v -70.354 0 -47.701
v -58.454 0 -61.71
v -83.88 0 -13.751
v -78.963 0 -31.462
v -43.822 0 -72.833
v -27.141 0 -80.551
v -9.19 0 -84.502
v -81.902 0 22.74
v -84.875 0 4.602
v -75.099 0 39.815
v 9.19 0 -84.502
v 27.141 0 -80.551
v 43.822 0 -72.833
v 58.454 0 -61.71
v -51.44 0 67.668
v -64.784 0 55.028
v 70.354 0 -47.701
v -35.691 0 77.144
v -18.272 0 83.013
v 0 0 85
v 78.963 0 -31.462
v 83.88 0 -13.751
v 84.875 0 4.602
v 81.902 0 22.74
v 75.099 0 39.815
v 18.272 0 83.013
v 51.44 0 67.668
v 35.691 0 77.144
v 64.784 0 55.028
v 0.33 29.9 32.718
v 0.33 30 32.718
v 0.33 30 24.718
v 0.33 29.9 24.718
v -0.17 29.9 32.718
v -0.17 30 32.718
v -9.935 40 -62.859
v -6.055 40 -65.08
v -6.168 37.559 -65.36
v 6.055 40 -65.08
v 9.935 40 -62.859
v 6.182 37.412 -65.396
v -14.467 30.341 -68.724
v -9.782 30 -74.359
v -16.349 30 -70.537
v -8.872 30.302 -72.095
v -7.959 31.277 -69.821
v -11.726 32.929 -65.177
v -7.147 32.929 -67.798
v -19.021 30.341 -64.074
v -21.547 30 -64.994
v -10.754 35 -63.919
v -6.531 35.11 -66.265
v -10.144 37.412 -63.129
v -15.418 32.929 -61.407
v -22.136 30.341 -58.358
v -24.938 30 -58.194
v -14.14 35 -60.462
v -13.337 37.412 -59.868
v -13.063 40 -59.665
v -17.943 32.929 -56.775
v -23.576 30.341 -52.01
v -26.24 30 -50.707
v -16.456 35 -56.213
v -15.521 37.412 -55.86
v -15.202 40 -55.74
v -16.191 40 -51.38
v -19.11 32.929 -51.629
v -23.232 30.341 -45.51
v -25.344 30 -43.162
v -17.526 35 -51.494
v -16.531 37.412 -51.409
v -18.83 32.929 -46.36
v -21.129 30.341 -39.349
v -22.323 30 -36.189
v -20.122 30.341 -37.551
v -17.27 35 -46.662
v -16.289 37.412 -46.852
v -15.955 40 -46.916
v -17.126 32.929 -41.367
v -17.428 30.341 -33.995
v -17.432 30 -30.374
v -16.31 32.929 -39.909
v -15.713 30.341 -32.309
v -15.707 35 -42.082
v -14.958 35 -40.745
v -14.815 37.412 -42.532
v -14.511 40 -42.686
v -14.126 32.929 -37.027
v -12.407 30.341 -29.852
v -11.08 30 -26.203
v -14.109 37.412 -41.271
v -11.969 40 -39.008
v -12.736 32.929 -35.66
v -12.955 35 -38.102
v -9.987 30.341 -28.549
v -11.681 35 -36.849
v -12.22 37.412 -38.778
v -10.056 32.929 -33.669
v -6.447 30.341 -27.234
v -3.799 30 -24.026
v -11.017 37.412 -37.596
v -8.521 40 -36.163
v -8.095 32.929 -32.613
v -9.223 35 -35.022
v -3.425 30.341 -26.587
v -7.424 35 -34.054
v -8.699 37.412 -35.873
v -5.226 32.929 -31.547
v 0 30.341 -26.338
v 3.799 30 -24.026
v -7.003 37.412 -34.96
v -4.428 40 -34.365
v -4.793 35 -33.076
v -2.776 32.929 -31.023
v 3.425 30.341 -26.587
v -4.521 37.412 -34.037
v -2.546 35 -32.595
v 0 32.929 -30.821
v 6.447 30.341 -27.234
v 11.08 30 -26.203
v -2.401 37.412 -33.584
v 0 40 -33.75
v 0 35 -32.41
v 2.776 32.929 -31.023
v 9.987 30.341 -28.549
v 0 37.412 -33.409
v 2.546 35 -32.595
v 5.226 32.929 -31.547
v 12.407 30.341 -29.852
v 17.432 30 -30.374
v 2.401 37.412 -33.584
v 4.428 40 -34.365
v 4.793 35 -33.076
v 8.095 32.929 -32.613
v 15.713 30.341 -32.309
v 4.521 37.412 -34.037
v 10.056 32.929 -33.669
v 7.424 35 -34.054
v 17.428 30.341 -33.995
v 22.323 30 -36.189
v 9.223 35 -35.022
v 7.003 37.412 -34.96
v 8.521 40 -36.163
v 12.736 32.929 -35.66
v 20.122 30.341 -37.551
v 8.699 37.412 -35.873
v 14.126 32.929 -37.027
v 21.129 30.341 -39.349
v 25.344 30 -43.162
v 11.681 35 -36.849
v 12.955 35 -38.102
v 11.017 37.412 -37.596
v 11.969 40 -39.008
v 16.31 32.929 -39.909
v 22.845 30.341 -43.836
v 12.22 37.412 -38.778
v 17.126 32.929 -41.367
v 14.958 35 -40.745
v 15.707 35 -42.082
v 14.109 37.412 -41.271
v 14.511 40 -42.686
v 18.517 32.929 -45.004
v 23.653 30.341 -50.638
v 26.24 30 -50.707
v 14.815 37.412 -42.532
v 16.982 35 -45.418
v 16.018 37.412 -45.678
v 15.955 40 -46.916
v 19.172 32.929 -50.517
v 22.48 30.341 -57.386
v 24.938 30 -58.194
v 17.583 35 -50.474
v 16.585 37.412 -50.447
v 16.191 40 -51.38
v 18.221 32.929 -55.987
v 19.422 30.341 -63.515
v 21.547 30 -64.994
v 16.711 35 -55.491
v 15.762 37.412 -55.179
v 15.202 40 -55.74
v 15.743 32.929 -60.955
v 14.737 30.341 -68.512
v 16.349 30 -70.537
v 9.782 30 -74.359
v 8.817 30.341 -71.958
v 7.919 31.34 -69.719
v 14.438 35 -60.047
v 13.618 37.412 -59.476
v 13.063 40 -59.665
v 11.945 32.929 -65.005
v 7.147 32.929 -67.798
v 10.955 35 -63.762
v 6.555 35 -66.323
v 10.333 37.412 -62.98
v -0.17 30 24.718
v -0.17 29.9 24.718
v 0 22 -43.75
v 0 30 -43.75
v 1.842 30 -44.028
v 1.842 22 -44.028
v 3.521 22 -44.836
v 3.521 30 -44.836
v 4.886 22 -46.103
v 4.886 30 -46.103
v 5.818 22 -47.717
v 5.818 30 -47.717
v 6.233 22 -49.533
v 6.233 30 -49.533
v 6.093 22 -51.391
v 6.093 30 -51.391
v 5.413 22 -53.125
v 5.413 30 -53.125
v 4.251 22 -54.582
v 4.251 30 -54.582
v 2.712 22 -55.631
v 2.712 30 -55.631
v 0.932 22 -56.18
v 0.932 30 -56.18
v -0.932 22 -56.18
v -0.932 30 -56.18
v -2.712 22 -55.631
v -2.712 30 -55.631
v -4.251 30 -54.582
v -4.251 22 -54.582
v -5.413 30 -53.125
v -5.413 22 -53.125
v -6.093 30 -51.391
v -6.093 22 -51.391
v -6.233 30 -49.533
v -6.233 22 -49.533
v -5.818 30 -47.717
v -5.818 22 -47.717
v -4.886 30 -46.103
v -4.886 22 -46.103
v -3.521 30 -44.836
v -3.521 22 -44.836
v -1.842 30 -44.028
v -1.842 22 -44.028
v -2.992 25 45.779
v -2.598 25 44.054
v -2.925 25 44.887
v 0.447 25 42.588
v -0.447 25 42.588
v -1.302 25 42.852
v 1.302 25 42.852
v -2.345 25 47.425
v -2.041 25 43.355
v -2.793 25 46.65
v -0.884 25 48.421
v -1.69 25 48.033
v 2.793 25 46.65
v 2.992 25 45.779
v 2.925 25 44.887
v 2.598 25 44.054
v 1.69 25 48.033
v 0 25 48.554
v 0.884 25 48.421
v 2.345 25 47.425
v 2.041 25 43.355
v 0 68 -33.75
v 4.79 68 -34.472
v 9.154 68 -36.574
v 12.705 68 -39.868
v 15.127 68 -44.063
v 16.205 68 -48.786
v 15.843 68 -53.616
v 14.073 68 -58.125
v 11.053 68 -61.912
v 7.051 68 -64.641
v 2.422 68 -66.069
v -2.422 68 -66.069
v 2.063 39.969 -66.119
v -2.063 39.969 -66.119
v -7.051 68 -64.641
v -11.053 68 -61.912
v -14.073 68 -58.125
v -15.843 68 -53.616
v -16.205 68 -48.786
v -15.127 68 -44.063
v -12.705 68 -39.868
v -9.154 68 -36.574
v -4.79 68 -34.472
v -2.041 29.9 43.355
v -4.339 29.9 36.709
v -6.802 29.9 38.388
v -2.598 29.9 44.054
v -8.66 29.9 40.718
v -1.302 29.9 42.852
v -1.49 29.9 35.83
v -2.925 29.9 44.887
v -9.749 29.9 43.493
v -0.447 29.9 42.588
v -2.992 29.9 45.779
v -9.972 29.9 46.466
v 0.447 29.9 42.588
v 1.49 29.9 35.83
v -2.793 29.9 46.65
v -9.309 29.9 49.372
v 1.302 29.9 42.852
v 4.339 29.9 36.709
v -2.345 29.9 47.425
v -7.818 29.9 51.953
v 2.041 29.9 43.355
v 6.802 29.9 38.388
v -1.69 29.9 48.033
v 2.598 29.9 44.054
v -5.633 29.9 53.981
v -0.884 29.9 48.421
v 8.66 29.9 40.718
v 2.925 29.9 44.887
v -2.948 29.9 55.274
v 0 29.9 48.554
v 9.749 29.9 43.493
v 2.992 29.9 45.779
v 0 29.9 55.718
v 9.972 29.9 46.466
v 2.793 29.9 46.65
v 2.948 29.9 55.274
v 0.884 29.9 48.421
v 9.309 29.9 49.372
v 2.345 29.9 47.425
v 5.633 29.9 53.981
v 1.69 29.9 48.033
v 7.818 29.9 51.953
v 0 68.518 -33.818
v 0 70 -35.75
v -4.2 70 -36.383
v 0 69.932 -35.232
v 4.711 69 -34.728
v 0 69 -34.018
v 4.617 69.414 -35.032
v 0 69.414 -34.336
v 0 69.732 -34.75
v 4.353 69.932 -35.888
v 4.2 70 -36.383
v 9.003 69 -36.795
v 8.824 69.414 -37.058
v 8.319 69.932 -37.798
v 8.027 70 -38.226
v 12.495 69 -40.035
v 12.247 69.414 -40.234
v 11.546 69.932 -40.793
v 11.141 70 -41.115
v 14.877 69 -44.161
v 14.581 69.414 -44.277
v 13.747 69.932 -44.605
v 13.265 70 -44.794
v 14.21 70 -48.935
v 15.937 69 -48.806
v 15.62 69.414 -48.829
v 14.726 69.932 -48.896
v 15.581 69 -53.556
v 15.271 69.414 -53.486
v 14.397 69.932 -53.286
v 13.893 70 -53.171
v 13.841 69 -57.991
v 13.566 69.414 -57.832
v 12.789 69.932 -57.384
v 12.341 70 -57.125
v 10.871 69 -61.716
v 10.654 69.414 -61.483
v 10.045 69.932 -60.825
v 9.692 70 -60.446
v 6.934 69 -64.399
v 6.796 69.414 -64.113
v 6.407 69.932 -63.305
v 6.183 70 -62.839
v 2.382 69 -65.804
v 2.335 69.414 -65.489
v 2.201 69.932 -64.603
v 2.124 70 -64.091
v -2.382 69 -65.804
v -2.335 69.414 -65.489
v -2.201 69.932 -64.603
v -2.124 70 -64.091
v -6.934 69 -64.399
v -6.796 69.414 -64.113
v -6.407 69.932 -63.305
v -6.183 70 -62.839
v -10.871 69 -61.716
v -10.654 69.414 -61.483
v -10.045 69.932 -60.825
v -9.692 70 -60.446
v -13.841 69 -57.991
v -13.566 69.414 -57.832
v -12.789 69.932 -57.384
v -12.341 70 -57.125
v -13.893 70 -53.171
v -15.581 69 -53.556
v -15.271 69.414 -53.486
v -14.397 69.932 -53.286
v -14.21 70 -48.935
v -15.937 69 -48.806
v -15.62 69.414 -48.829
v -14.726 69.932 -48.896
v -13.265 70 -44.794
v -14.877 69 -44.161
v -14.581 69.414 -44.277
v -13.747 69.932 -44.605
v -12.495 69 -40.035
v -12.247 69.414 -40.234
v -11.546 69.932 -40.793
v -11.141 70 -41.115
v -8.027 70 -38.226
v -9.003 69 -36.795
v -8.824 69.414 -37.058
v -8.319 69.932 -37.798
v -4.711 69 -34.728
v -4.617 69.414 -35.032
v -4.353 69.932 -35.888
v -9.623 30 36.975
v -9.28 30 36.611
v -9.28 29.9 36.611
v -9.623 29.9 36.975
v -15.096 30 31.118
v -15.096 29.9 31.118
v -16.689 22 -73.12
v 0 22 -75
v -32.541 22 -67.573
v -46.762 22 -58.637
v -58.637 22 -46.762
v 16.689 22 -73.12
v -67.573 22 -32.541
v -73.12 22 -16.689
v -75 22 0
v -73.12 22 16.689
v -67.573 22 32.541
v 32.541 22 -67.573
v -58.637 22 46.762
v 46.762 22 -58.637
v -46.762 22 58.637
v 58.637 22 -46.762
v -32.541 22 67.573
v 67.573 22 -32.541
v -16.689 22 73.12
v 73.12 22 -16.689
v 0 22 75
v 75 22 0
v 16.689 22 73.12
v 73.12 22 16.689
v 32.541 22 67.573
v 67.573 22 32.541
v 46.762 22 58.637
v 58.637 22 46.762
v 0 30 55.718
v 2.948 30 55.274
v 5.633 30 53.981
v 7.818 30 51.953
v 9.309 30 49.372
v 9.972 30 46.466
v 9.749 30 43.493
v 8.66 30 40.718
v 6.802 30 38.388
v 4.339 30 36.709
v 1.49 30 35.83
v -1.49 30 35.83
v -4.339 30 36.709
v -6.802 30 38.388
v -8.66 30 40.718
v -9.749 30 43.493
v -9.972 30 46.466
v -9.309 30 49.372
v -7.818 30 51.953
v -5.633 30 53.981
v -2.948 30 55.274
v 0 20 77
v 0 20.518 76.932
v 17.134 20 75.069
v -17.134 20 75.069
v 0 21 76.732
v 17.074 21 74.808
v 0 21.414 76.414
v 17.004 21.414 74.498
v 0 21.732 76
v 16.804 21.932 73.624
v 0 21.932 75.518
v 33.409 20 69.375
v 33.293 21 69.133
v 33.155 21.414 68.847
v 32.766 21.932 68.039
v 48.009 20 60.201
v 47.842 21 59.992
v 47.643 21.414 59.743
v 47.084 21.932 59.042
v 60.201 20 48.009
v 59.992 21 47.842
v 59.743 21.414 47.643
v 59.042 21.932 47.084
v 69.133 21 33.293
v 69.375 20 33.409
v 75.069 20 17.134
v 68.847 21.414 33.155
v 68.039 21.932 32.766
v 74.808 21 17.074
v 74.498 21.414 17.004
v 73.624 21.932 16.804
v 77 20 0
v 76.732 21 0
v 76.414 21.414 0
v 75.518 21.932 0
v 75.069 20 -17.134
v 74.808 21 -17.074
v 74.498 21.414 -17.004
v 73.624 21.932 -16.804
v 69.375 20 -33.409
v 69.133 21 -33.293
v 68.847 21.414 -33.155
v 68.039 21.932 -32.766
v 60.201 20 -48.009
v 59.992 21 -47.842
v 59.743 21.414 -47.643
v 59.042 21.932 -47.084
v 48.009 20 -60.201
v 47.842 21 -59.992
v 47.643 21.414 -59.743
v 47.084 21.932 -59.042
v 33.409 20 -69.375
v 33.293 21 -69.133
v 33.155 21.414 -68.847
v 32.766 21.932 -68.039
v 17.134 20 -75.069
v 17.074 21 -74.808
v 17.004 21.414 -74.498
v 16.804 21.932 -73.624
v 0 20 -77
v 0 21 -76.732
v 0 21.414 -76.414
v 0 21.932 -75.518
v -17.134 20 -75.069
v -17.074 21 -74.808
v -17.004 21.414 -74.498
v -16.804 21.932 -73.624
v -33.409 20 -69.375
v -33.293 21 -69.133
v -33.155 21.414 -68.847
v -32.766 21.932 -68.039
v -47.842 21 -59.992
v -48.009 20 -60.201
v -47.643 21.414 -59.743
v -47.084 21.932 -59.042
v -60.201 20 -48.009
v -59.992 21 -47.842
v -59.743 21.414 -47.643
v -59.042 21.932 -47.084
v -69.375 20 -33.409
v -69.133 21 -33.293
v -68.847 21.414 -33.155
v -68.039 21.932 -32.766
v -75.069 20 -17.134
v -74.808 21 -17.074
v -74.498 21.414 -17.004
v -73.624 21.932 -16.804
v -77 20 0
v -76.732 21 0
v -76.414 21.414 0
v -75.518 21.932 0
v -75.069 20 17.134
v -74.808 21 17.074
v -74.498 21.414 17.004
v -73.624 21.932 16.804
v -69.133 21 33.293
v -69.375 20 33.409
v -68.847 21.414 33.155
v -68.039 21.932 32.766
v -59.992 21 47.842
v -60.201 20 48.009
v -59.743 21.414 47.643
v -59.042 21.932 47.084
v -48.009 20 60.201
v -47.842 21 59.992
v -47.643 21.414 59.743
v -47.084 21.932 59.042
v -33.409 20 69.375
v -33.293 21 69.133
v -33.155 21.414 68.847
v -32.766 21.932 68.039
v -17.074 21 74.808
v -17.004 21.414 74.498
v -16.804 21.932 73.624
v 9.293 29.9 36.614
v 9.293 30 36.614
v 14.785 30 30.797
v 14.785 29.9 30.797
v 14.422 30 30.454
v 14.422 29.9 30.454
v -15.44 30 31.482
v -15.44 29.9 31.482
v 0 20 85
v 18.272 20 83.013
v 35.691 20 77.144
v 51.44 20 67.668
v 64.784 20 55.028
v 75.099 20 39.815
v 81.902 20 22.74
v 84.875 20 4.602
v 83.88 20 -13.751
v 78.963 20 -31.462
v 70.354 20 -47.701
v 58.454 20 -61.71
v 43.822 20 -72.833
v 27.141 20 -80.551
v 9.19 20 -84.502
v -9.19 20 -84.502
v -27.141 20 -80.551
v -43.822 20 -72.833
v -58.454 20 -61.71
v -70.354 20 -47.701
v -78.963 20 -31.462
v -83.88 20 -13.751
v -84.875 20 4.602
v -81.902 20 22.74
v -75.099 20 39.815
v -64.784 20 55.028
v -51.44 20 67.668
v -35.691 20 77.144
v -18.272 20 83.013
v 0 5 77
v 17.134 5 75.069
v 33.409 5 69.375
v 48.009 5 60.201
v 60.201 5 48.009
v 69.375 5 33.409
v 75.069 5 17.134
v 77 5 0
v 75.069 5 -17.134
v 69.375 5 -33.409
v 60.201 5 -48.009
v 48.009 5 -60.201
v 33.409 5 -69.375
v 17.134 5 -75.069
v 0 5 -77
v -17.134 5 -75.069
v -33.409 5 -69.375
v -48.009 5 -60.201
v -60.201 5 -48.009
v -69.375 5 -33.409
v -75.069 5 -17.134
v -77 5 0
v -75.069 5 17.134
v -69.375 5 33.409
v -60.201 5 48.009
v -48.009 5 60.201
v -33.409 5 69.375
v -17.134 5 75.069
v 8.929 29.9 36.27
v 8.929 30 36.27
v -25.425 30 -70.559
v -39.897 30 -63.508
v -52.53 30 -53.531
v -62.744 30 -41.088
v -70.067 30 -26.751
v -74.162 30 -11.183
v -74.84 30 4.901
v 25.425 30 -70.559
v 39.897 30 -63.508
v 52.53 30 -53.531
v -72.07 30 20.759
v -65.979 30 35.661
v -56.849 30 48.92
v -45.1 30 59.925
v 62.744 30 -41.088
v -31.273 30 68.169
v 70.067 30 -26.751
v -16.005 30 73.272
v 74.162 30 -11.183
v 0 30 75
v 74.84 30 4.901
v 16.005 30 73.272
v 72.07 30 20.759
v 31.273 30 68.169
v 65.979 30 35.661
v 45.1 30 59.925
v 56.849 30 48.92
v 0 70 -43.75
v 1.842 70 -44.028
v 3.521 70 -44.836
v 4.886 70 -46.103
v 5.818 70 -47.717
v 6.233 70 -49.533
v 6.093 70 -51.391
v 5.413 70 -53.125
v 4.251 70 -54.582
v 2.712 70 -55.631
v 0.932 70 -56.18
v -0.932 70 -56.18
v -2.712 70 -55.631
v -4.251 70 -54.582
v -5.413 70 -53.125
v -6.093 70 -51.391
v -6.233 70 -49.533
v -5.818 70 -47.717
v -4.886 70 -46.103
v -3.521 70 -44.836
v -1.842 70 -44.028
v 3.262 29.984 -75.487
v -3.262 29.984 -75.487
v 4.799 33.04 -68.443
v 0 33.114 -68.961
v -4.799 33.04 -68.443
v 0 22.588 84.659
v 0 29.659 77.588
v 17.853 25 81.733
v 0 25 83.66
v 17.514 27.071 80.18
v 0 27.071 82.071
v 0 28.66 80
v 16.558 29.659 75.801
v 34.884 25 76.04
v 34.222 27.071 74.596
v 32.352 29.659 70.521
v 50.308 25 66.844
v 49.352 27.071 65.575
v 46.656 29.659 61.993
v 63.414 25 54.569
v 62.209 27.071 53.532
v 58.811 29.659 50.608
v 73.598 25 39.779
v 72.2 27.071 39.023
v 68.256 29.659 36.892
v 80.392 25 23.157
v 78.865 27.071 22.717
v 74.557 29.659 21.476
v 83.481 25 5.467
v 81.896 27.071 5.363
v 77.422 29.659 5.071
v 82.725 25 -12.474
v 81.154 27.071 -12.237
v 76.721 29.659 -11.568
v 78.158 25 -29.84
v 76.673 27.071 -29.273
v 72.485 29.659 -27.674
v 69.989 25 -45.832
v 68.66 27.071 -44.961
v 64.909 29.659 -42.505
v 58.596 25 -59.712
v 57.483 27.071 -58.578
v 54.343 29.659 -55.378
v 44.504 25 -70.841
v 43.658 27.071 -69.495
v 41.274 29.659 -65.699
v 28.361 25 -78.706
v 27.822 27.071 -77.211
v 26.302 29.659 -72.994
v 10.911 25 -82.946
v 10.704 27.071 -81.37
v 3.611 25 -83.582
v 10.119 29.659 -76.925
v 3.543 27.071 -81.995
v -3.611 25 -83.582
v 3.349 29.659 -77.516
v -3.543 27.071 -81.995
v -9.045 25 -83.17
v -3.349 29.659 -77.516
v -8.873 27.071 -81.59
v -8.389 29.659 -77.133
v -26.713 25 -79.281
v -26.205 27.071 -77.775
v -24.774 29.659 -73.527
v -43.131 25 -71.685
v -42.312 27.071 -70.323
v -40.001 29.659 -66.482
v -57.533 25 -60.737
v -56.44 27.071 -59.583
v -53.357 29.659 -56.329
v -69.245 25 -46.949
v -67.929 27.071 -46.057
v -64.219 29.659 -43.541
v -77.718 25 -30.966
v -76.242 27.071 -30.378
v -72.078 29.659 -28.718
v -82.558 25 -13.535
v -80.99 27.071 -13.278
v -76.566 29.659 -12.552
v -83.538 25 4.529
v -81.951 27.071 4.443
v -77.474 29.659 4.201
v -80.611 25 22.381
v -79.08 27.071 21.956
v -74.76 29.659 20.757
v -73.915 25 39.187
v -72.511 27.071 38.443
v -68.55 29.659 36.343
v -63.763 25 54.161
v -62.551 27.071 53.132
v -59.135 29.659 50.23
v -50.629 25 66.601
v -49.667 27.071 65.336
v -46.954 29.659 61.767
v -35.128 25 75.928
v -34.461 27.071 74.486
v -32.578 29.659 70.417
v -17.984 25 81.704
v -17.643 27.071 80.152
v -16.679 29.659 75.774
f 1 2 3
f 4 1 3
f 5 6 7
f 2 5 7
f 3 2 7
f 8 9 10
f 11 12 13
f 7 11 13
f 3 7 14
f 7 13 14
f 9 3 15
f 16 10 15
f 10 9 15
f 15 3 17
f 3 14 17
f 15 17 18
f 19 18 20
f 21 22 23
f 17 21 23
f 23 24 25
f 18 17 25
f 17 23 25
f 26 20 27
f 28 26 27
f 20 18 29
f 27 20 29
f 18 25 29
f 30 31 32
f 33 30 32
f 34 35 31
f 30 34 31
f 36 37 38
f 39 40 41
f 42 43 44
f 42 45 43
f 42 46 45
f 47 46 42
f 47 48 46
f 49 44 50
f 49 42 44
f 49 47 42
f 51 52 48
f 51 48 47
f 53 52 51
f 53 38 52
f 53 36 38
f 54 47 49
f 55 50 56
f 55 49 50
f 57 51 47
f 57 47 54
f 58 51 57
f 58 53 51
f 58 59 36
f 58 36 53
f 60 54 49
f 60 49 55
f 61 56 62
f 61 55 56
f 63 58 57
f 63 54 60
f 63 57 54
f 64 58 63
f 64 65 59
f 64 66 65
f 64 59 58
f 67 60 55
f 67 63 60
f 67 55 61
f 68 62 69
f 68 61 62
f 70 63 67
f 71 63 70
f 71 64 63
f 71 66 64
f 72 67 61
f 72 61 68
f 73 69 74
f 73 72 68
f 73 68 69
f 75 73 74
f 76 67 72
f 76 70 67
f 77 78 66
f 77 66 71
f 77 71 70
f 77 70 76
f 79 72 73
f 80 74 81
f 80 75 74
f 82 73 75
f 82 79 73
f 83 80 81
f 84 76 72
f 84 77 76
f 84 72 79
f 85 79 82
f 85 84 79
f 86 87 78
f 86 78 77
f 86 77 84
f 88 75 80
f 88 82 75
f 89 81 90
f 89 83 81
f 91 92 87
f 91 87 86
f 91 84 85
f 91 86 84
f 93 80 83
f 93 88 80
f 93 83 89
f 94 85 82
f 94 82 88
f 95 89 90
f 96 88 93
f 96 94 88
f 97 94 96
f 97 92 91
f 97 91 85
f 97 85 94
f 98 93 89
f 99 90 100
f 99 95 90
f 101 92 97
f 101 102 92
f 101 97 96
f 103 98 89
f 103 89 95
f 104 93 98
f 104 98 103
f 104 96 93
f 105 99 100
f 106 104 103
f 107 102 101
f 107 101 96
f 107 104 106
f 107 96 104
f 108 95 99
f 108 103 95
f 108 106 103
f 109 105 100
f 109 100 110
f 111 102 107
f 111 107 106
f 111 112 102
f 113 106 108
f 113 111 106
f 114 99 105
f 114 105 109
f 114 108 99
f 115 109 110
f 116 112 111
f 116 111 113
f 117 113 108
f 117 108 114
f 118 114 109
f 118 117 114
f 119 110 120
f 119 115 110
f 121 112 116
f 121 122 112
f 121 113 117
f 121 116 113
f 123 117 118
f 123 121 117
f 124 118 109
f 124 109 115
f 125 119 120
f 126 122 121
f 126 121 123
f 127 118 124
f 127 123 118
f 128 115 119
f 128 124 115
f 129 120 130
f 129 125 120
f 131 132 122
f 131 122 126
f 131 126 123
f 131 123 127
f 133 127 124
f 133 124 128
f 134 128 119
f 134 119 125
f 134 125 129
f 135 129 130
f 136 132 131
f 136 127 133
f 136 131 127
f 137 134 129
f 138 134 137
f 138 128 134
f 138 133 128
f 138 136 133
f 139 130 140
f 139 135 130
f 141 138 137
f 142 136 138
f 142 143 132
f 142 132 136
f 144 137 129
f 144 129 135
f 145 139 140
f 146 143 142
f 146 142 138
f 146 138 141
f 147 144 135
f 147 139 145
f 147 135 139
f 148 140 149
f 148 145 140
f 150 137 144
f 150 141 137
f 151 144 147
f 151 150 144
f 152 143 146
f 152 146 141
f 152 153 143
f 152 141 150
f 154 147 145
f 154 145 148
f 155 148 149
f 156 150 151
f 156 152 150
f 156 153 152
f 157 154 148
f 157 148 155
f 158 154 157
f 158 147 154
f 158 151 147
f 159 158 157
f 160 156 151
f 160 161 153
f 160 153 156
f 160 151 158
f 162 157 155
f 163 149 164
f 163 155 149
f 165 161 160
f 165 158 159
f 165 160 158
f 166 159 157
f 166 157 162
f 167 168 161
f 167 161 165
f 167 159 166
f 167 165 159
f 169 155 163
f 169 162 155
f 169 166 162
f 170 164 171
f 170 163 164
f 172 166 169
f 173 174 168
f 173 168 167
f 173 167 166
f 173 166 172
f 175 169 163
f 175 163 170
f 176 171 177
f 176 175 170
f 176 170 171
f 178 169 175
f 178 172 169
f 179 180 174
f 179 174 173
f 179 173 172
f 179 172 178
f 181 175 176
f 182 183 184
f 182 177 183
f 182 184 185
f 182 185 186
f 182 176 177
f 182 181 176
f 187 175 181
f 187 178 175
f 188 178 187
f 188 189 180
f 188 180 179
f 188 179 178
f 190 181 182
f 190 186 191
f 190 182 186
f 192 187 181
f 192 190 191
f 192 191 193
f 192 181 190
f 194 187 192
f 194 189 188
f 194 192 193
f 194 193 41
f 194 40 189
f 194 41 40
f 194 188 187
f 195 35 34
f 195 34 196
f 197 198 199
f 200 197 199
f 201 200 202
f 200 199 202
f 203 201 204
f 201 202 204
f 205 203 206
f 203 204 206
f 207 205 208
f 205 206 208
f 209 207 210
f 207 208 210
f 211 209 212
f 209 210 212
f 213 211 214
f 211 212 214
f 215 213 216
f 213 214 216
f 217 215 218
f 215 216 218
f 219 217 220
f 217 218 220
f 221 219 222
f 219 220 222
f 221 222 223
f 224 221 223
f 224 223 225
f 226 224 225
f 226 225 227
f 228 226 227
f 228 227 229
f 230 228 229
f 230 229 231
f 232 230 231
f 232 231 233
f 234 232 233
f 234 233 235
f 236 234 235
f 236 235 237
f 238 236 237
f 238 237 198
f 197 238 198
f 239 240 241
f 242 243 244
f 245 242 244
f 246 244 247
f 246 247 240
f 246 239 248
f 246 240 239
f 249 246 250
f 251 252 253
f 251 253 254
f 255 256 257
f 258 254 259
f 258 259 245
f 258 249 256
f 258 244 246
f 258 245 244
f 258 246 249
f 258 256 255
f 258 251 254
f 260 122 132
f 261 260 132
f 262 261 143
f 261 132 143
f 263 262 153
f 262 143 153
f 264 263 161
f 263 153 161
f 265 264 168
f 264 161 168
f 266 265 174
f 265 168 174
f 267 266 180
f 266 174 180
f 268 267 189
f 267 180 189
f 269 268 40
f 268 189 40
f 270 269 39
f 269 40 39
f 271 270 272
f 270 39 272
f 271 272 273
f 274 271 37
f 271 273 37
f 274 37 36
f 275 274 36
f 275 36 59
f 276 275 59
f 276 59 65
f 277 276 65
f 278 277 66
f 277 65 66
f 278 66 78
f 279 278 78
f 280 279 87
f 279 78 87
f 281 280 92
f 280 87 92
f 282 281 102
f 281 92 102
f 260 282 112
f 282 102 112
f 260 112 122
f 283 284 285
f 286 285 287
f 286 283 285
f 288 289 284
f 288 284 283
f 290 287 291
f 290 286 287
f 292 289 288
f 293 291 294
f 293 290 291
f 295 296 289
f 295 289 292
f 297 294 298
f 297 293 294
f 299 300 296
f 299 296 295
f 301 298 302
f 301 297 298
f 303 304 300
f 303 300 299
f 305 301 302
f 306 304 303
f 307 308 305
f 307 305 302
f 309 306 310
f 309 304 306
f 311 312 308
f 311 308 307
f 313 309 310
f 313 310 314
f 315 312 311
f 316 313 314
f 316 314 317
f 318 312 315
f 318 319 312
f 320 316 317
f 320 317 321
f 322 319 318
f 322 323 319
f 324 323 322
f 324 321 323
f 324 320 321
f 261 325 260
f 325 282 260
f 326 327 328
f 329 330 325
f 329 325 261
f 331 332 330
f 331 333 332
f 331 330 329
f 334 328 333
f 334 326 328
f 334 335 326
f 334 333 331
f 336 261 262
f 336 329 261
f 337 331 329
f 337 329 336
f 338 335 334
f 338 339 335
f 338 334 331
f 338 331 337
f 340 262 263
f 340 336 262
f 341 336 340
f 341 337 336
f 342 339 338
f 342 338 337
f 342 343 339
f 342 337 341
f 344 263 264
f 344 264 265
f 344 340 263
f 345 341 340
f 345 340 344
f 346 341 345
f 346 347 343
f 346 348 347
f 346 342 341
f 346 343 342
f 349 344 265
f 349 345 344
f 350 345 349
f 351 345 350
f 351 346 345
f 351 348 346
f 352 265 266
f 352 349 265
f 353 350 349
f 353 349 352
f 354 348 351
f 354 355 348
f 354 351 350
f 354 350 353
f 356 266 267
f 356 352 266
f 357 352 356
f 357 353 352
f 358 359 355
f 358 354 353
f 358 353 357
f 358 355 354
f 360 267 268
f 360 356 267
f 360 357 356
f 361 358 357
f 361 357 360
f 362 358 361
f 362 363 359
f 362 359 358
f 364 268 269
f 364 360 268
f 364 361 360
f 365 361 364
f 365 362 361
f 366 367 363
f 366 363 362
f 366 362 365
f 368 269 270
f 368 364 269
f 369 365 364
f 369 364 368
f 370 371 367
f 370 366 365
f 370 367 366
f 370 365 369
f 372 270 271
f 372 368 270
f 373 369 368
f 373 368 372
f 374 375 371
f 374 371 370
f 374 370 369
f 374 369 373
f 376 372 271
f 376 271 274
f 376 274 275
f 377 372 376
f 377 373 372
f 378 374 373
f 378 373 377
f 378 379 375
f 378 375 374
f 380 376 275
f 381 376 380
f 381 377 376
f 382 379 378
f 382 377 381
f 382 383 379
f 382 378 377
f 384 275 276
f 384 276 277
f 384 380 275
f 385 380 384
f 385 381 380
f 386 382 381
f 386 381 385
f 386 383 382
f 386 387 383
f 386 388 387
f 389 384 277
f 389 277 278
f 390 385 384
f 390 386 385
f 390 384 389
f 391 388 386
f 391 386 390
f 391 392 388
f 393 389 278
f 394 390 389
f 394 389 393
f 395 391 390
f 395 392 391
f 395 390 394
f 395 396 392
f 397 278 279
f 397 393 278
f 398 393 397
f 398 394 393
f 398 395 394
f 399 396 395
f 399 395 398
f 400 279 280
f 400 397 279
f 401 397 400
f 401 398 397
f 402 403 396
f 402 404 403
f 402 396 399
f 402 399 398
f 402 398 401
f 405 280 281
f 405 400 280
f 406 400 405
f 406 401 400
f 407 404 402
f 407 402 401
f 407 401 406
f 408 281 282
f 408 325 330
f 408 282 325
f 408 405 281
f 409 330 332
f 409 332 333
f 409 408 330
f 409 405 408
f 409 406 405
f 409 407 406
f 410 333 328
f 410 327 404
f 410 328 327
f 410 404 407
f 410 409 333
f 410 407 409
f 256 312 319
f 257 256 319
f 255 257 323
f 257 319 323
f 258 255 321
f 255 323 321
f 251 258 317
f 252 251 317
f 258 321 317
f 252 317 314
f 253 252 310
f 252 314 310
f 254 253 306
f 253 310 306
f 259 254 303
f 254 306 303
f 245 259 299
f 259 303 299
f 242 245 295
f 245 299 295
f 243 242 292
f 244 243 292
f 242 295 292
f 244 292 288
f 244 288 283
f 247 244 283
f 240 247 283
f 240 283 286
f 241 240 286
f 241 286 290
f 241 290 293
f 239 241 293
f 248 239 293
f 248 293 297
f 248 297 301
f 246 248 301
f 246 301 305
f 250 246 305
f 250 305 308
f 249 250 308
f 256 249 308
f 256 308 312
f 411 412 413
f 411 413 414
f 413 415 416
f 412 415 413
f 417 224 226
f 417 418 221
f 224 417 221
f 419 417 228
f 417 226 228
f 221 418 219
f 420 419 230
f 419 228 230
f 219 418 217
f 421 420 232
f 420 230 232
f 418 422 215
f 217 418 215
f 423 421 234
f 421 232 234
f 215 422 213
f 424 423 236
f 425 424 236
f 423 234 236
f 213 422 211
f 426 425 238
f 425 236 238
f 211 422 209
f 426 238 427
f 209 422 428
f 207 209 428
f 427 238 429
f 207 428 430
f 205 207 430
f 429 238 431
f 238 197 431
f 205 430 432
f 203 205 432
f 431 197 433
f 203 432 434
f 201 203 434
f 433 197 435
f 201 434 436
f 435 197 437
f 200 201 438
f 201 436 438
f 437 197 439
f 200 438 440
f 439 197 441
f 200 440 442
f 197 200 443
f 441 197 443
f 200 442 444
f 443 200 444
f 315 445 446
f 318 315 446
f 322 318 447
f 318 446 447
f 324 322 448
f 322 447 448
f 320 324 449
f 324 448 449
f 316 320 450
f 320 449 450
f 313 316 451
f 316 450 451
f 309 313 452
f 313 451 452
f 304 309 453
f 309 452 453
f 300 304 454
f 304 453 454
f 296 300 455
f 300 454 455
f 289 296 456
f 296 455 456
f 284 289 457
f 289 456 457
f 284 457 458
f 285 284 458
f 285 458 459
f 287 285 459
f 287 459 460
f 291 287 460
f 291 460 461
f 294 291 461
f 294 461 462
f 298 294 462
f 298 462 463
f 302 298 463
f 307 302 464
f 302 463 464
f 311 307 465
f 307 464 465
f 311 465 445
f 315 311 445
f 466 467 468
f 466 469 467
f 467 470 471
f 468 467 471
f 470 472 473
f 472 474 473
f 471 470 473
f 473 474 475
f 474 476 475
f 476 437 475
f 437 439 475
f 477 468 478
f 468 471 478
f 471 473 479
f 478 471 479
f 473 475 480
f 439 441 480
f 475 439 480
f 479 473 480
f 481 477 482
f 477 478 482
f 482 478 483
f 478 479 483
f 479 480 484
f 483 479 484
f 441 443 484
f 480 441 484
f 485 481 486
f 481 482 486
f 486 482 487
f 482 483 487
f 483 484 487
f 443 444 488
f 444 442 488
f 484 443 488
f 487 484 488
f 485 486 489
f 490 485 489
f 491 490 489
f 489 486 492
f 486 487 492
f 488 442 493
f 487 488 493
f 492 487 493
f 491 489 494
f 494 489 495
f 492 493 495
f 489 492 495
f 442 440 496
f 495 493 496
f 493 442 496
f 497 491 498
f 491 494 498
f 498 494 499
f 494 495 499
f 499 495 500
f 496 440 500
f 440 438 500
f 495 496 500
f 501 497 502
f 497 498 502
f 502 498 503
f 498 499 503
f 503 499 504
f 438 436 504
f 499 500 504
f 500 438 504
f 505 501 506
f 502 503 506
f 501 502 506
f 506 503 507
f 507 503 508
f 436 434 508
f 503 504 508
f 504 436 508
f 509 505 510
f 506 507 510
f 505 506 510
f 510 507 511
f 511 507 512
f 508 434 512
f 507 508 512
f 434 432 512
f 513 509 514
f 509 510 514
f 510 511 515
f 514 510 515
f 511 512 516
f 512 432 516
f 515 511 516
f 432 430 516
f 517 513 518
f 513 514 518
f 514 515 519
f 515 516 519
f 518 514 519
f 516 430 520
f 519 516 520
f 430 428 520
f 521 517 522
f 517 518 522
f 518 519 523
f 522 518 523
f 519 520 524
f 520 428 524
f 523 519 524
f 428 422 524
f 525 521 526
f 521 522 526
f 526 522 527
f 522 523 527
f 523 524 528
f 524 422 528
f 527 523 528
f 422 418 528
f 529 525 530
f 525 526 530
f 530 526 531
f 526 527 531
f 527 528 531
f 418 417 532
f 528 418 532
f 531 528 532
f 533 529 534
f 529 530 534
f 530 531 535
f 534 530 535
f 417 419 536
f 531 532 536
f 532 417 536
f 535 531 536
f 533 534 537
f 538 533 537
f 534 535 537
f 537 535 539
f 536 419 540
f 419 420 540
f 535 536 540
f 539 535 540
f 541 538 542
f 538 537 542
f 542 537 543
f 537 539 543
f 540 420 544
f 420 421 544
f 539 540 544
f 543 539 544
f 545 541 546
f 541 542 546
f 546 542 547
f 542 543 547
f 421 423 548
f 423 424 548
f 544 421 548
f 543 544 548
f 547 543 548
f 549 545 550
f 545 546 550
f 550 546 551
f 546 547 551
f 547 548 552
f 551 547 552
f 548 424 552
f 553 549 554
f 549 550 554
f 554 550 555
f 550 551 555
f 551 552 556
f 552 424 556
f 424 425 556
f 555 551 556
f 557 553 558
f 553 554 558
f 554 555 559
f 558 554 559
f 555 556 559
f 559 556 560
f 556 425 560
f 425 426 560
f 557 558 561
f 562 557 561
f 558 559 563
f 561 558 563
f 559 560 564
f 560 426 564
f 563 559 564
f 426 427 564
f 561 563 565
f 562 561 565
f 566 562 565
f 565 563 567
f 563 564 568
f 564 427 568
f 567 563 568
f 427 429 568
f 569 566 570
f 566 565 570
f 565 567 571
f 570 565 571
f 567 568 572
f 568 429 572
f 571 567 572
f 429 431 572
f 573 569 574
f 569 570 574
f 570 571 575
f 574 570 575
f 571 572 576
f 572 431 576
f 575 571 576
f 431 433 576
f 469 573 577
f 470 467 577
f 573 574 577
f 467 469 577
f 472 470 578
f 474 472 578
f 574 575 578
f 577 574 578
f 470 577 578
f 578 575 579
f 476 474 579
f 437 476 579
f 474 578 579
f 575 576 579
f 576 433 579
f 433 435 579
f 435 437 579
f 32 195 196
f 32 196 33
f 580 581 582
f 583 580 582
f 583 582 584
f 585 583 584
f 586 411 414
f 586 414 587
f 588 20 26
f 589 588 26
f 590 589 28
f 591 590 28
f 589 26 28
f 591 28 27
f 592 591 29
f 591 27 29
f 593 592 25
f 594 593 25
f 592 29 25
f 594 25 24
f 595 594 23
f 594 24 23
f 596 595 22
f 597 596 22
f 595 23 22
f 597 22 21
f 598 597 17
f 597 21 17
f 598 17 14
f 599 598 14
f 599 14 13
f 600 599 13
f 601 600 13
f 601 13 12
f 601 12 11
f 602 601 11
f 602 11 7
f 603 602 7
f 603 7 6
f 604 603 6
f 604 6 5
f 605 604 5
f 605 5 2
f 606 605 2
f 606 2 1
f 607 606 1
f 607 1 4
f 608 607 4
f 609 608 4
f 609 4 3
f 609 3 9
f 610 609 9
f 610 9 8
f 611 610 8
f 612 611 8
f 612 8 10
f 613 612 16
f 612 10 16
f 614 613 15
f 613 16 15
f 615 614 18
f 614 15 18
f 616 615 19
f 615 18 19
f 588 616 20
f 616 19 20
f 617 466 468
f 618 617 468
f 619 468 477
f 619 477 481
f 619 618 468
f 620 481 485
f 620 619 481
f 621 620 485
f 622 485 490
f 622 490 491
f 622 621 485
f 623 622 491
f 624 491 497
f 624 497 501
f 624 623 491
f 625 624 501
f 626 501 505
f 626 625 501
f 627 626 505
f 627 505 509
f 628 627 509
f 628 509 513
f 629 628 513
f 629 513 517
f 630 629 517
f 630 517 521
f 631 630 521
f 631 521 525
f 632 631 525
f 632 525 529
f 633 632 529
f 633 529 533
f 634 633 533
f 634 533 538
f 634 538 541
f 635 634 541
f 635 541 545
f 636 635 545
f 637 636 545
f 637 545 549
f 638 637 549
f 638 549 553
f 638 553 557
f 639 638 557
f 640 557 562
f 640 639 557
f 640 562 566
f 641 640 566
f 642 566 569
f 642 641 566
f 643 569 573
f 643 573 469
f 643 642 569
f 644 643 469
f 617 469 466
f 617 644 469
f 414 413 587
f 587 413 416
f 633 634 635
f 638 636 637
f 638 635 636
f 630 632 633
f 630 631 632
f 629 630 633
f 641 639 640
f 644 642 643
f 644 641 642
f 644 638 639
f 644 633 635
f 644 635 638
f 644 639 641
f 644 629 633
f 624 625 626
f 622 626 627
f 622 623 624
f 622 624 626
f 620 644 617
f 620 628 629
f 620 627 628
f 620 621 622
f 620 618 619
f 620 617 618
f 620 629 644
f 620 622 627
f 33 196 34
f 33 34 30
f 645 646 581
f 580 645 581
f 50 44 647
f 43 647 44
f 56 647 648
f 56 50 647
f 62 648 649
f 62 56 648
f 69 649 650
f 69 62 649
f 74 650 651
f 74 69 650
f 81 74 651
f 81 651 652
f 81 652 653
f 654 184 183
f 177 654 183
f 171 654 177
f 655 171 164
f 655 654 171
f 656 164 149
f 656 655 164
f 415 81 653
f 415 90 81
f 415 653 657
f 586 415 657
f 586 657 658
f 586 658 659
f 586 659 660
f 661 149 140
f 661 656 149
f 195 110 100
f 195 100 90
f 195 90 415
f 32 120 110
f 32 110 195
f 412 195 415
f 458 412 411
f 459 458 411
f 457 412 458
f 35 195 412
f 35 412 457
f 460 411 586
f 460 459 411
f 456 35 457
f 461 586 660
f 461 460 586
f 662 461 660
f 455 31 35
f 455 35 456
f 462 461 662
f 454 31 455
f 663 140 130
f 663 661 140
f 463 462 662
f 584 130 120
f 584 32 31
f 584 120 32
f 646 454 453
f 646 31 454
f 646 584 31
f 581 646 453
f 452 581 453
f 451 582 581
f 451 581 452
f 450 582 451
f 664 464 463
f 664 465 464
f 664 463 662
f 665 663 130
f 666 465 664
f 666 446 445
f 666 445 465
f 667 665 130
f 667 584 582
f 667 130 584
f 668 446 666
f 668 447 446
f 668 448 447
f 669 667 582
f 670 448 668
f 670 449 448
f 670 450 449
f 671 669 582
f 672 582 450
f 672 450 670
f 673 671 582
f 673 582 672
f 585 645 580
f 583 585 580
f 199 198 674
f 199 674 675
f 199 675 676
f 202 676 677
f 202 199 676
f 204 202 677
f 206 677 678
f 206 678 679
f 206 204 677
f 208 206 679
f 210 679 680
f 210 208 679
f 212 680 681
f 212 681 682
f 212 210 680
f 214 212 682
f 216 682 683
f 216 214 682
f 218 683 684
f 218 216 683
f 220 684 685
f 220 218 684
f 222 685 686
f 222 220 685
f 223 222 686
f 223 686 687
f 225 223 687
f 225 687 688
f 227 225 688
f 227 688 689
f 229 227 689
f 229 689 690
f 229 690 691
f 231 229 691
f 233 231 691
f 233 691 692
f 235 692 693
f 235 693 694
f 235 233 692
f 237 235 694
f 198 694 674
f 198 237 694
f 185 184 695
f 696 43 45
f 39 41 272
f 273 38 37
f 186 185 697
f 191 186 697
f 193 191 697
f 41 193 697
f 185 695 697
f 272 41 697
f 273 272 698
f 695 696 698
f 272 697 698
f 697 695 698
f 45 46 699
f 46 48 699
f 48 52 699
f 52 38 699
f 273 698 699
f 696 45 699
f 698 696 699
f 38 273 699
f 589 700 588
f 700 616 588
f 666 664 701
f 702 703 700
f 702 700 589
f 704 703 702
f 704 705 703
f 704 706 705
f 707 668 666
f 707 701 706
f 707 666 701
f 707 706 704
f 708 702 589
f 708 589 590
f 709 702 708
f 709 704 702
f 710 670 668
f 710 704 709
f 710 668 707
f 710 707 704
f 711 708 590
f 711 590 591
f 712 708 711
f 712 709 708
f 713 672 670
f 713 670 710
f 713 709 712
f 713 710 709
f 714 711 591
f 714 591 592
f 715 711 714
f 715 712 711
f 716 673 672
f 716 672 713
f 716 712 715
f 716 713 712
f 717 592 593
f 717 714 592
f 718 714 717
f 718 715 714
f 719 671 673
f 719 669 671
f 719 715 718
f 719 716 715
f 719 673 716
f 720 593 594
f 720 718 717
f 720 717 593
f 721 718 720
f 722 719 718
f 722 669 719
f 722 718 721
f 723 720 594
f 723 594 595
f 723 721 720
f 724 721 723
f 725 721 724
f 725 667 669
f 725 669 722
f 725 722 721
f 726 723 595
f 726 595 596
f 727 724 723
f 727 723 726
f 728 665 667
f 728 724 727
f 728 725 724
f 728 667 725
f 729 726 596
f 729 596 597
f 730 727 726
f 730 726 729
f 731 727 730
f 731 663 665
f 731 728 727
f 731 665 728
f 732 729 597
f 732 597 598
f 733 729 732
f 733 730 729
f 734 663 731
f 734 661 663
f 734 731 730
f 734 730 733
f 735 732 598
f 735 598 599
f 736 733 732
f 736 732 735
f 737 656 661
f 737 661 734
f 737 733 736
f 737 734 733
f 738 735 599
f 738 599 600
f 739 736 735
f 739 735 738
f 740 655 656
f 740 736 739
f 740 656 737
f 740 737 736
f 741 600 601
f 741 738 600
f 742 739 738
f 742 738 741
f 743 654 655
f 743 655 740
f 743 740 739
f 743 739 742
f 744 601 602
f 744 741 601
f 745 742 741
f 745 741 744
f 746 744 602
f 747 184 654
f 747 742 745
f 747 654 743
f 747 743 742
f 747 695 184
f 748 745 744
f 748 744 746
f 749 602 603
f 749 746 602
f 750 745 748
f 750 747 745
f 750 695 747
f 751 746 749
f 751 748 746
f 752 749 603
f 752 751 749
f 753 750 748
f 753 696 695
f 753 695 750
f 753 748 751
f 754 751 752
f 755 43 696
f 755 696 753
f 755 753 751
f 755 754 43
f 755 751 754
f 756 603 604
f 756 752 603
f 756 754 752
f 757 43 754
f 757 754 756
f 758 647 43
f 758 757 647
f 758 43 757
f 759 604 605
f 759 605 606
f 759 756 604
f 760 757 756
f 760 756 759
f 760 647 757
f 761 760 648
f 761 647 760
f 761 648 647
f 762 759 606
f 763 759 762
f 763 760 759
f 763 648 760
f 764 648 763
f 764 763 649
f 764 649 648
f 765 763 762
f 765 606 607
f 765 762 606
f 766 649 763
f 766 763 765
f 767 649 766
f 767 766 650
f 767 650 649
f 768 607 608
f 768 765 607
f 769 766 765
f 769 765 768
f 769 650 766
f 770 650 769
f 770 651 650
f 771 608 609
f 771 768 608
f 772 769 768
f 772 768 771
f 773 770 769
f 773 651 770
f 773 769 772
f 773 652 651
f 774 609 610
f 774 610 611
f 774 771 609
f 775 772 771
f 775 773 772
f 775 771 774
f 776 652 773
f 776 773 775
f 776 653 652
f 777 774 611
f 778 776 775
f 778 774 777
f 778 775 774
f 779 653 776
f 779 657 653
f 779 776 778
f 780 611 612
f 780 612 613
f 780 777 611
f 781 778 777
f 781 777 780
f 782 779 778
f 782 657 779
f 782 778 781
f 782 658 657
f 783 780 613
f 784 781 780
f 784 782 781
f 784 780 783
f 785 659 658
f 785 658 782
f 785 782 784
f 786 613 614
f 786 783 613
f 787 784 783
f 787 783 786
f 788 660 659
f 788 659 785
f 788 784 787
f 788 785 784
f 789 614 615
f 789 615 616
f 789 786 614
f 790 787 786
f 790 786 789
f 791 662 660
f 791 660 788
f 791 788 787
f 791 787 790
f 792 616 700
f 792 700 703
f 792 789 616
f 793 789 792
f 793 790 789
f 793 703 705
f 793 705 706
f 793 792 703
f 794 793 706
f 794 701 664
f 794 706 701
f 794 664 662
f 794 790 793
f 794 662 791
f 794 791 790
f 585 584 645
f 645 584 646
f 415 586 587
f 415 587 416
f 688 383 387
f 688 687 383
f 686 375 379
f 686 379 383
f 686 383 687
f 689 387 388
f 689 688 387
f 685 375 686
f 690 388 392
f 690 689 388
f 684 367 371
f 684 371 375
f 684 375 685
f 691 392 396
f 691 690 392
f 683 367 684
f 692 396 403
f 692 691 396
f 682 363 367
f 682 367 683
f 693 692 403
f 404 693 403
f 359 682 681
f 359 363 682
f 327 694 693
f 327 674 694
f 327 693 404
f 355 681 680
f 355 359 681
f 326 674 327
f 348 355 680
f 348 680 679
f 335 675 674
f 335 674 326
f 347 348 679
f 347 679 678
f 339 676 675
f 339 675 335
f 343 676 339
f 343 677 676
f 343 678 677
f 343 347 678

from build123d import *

# Parameters (mm, degrees)
SKETCH1_R           = 85
BOSS_EXTRUDE1_DEPTH = 30
FILLET1_R           = 10
SHELL1_T            = -8
SKETCH1_2_R         = 85
BOSS_EXTRUDE3_DEPTH = 5
SKETCH2_R           = 16.25
SKETCH2_R_2         = 6.25
BOSS_EXTRUDE2_DEPTH = 40
CUT_EXTRUDE1_REACH  = 128.689
SKETCH2_3_R         = 6.25
FILLET2_R           = 10
FILLET3_R           = 2
SKETCH3_R           = 3
CUT_EXTRUDE2_DEPTH  = 5
SKETCH4_R           = 10
SKETCH4_W           = 0.5
SKETCH4_H           = 8
CUT_EXTRUDE3_DEPTH  = 0.1


with BuildPart() as part:
    # Sketch1 → Boss-Extrude1 (new body)
    with BuildSketch(Plane(origin=(0, 0, 0), x_dir=(1, 0, 0), z_dir=(0, 1, 0))):
        Circle(SKETCH1_R)
    extrude(amount=BOSS_EXTRUDE1_DEPTH)

    # Fillet1
    fillet1_edges = [part.edges().sort_by_distance(p)[0] for p in [
        (-85, 30, 0),
    ]]
    fillet(fillet1_edges, radius=FILLET1_R)

    # Shell1
    shell1_openings = [part.faces().sort_by_distance(p)[0] for p in [
        (0, 0, 0),
    ]]
    offset(amount=SHELL1_T, openings=shell1_openings, kind=Kind.INTERSECTION)

    # Sketch1<2> → Boss-Extrude3 (add)
    with BuildSketch(Plane(origin=(0, 0, 0), x_dir=(1, 0, 0), z_dir=(0, 1, 0))):
        Circle(SKETCH1_2_R)
    extrude(amount=BOSS_EXTRUDE3_DEPTH)

    # Sketch2 → Boss-Extrude2 (add)
    with BuildSketch(Plane(origin=(0, 30, 0), x_dir=(1, 0, 0), z_dir=(0, 1, 0))):
        with Locations((0, 50)):
            Circle(SKETCH2_R)
        with Locations((0, 50)):
            Circle(SKETCH2_R_2, mode=Mode.SUBTRACT)
    extrude(amount=BOSS_EXTRUDE2_DEPTH)

    # Sketch2<3> → Cut-Extrude1 (cut, up to next)
    with BuildSketch(Plane(origin=(0, 30, 0), x_dir=(1, 0, 0), z_dir=(0, 1, 0)), mode=Mode.PRIVATE) as cut_extrude1_sk1:
        with Locations((0, 50)):
            Circle(SKETCH2_3_R)
    cut_extrude1_tool1 = extrude(cut_extrude1_sk1.sketch, amount=-CUT_EXTRUDE1_REACH, mode=Mode.PRIVATE) & part.part
    add(cut_extrude1_tool1.solids().sort_by_distance((0, 30, -50))[0], mode=Mode.SUBTRACT)

    # Fillet2
    fillet2_edges = [part.edges().sort_by_distance(p)[0] for p in [
        (-16.25, 30, -50),
    ]]
    fillet(fillet2_edges, radius=FILLET2_R)

    # Fillet3
    fillet3_edges = [part.edges().sort_by_distance(p)[0] for p in [
        (-16.25, 70, -50),
    ]]
    fillet(fillet3_edges, radius=FILLET3_R)

    # Sketch3 → Cut-Extrude2 (cut)
    with BuildSketch(Plane(origin=(0, 30, 0), x_dir=(1, 0, 0), z_dir=(0, 1, 0))):
        with Locations((0, -45.554448546)):
            Circle(SKETCH3_R)
    extrude(amount=-CUT_EXTRUDE2_DEPTH, mode=Mode.SUBTRACT)

    # Sketch4 → Cut-Extrude3 (cut)
    with BuildSketch(Plane(origin=(0, 30, 0), x_dir=(1, 0, 0), z_dir=(0, 1, 0))):
        with Locations((0, -45.718475917)):
            Circle(SKETCH4_R)
        Polygon((8.929220054, -36.270245709), (9.292745114, -36.613537902), (14.78542021, -30.797136927), (14.421895149, -30.453844734), align=None)
        with Locations((0.080103939, -28.718475917)):
            Rectangle(SKETCH4_W, SKETCH4_H)
        Polygon((-9.280005487, -36.611116357), (-9.623297681, -36.974641418), (-15.439698655, -31.481966322), (-15.096406462, -31.118441261), align=None)
    extrude(amount=-CUT_EXTRUDE3_DEPTH, mode=Mode.SUBTRACT)


solid = part.part
